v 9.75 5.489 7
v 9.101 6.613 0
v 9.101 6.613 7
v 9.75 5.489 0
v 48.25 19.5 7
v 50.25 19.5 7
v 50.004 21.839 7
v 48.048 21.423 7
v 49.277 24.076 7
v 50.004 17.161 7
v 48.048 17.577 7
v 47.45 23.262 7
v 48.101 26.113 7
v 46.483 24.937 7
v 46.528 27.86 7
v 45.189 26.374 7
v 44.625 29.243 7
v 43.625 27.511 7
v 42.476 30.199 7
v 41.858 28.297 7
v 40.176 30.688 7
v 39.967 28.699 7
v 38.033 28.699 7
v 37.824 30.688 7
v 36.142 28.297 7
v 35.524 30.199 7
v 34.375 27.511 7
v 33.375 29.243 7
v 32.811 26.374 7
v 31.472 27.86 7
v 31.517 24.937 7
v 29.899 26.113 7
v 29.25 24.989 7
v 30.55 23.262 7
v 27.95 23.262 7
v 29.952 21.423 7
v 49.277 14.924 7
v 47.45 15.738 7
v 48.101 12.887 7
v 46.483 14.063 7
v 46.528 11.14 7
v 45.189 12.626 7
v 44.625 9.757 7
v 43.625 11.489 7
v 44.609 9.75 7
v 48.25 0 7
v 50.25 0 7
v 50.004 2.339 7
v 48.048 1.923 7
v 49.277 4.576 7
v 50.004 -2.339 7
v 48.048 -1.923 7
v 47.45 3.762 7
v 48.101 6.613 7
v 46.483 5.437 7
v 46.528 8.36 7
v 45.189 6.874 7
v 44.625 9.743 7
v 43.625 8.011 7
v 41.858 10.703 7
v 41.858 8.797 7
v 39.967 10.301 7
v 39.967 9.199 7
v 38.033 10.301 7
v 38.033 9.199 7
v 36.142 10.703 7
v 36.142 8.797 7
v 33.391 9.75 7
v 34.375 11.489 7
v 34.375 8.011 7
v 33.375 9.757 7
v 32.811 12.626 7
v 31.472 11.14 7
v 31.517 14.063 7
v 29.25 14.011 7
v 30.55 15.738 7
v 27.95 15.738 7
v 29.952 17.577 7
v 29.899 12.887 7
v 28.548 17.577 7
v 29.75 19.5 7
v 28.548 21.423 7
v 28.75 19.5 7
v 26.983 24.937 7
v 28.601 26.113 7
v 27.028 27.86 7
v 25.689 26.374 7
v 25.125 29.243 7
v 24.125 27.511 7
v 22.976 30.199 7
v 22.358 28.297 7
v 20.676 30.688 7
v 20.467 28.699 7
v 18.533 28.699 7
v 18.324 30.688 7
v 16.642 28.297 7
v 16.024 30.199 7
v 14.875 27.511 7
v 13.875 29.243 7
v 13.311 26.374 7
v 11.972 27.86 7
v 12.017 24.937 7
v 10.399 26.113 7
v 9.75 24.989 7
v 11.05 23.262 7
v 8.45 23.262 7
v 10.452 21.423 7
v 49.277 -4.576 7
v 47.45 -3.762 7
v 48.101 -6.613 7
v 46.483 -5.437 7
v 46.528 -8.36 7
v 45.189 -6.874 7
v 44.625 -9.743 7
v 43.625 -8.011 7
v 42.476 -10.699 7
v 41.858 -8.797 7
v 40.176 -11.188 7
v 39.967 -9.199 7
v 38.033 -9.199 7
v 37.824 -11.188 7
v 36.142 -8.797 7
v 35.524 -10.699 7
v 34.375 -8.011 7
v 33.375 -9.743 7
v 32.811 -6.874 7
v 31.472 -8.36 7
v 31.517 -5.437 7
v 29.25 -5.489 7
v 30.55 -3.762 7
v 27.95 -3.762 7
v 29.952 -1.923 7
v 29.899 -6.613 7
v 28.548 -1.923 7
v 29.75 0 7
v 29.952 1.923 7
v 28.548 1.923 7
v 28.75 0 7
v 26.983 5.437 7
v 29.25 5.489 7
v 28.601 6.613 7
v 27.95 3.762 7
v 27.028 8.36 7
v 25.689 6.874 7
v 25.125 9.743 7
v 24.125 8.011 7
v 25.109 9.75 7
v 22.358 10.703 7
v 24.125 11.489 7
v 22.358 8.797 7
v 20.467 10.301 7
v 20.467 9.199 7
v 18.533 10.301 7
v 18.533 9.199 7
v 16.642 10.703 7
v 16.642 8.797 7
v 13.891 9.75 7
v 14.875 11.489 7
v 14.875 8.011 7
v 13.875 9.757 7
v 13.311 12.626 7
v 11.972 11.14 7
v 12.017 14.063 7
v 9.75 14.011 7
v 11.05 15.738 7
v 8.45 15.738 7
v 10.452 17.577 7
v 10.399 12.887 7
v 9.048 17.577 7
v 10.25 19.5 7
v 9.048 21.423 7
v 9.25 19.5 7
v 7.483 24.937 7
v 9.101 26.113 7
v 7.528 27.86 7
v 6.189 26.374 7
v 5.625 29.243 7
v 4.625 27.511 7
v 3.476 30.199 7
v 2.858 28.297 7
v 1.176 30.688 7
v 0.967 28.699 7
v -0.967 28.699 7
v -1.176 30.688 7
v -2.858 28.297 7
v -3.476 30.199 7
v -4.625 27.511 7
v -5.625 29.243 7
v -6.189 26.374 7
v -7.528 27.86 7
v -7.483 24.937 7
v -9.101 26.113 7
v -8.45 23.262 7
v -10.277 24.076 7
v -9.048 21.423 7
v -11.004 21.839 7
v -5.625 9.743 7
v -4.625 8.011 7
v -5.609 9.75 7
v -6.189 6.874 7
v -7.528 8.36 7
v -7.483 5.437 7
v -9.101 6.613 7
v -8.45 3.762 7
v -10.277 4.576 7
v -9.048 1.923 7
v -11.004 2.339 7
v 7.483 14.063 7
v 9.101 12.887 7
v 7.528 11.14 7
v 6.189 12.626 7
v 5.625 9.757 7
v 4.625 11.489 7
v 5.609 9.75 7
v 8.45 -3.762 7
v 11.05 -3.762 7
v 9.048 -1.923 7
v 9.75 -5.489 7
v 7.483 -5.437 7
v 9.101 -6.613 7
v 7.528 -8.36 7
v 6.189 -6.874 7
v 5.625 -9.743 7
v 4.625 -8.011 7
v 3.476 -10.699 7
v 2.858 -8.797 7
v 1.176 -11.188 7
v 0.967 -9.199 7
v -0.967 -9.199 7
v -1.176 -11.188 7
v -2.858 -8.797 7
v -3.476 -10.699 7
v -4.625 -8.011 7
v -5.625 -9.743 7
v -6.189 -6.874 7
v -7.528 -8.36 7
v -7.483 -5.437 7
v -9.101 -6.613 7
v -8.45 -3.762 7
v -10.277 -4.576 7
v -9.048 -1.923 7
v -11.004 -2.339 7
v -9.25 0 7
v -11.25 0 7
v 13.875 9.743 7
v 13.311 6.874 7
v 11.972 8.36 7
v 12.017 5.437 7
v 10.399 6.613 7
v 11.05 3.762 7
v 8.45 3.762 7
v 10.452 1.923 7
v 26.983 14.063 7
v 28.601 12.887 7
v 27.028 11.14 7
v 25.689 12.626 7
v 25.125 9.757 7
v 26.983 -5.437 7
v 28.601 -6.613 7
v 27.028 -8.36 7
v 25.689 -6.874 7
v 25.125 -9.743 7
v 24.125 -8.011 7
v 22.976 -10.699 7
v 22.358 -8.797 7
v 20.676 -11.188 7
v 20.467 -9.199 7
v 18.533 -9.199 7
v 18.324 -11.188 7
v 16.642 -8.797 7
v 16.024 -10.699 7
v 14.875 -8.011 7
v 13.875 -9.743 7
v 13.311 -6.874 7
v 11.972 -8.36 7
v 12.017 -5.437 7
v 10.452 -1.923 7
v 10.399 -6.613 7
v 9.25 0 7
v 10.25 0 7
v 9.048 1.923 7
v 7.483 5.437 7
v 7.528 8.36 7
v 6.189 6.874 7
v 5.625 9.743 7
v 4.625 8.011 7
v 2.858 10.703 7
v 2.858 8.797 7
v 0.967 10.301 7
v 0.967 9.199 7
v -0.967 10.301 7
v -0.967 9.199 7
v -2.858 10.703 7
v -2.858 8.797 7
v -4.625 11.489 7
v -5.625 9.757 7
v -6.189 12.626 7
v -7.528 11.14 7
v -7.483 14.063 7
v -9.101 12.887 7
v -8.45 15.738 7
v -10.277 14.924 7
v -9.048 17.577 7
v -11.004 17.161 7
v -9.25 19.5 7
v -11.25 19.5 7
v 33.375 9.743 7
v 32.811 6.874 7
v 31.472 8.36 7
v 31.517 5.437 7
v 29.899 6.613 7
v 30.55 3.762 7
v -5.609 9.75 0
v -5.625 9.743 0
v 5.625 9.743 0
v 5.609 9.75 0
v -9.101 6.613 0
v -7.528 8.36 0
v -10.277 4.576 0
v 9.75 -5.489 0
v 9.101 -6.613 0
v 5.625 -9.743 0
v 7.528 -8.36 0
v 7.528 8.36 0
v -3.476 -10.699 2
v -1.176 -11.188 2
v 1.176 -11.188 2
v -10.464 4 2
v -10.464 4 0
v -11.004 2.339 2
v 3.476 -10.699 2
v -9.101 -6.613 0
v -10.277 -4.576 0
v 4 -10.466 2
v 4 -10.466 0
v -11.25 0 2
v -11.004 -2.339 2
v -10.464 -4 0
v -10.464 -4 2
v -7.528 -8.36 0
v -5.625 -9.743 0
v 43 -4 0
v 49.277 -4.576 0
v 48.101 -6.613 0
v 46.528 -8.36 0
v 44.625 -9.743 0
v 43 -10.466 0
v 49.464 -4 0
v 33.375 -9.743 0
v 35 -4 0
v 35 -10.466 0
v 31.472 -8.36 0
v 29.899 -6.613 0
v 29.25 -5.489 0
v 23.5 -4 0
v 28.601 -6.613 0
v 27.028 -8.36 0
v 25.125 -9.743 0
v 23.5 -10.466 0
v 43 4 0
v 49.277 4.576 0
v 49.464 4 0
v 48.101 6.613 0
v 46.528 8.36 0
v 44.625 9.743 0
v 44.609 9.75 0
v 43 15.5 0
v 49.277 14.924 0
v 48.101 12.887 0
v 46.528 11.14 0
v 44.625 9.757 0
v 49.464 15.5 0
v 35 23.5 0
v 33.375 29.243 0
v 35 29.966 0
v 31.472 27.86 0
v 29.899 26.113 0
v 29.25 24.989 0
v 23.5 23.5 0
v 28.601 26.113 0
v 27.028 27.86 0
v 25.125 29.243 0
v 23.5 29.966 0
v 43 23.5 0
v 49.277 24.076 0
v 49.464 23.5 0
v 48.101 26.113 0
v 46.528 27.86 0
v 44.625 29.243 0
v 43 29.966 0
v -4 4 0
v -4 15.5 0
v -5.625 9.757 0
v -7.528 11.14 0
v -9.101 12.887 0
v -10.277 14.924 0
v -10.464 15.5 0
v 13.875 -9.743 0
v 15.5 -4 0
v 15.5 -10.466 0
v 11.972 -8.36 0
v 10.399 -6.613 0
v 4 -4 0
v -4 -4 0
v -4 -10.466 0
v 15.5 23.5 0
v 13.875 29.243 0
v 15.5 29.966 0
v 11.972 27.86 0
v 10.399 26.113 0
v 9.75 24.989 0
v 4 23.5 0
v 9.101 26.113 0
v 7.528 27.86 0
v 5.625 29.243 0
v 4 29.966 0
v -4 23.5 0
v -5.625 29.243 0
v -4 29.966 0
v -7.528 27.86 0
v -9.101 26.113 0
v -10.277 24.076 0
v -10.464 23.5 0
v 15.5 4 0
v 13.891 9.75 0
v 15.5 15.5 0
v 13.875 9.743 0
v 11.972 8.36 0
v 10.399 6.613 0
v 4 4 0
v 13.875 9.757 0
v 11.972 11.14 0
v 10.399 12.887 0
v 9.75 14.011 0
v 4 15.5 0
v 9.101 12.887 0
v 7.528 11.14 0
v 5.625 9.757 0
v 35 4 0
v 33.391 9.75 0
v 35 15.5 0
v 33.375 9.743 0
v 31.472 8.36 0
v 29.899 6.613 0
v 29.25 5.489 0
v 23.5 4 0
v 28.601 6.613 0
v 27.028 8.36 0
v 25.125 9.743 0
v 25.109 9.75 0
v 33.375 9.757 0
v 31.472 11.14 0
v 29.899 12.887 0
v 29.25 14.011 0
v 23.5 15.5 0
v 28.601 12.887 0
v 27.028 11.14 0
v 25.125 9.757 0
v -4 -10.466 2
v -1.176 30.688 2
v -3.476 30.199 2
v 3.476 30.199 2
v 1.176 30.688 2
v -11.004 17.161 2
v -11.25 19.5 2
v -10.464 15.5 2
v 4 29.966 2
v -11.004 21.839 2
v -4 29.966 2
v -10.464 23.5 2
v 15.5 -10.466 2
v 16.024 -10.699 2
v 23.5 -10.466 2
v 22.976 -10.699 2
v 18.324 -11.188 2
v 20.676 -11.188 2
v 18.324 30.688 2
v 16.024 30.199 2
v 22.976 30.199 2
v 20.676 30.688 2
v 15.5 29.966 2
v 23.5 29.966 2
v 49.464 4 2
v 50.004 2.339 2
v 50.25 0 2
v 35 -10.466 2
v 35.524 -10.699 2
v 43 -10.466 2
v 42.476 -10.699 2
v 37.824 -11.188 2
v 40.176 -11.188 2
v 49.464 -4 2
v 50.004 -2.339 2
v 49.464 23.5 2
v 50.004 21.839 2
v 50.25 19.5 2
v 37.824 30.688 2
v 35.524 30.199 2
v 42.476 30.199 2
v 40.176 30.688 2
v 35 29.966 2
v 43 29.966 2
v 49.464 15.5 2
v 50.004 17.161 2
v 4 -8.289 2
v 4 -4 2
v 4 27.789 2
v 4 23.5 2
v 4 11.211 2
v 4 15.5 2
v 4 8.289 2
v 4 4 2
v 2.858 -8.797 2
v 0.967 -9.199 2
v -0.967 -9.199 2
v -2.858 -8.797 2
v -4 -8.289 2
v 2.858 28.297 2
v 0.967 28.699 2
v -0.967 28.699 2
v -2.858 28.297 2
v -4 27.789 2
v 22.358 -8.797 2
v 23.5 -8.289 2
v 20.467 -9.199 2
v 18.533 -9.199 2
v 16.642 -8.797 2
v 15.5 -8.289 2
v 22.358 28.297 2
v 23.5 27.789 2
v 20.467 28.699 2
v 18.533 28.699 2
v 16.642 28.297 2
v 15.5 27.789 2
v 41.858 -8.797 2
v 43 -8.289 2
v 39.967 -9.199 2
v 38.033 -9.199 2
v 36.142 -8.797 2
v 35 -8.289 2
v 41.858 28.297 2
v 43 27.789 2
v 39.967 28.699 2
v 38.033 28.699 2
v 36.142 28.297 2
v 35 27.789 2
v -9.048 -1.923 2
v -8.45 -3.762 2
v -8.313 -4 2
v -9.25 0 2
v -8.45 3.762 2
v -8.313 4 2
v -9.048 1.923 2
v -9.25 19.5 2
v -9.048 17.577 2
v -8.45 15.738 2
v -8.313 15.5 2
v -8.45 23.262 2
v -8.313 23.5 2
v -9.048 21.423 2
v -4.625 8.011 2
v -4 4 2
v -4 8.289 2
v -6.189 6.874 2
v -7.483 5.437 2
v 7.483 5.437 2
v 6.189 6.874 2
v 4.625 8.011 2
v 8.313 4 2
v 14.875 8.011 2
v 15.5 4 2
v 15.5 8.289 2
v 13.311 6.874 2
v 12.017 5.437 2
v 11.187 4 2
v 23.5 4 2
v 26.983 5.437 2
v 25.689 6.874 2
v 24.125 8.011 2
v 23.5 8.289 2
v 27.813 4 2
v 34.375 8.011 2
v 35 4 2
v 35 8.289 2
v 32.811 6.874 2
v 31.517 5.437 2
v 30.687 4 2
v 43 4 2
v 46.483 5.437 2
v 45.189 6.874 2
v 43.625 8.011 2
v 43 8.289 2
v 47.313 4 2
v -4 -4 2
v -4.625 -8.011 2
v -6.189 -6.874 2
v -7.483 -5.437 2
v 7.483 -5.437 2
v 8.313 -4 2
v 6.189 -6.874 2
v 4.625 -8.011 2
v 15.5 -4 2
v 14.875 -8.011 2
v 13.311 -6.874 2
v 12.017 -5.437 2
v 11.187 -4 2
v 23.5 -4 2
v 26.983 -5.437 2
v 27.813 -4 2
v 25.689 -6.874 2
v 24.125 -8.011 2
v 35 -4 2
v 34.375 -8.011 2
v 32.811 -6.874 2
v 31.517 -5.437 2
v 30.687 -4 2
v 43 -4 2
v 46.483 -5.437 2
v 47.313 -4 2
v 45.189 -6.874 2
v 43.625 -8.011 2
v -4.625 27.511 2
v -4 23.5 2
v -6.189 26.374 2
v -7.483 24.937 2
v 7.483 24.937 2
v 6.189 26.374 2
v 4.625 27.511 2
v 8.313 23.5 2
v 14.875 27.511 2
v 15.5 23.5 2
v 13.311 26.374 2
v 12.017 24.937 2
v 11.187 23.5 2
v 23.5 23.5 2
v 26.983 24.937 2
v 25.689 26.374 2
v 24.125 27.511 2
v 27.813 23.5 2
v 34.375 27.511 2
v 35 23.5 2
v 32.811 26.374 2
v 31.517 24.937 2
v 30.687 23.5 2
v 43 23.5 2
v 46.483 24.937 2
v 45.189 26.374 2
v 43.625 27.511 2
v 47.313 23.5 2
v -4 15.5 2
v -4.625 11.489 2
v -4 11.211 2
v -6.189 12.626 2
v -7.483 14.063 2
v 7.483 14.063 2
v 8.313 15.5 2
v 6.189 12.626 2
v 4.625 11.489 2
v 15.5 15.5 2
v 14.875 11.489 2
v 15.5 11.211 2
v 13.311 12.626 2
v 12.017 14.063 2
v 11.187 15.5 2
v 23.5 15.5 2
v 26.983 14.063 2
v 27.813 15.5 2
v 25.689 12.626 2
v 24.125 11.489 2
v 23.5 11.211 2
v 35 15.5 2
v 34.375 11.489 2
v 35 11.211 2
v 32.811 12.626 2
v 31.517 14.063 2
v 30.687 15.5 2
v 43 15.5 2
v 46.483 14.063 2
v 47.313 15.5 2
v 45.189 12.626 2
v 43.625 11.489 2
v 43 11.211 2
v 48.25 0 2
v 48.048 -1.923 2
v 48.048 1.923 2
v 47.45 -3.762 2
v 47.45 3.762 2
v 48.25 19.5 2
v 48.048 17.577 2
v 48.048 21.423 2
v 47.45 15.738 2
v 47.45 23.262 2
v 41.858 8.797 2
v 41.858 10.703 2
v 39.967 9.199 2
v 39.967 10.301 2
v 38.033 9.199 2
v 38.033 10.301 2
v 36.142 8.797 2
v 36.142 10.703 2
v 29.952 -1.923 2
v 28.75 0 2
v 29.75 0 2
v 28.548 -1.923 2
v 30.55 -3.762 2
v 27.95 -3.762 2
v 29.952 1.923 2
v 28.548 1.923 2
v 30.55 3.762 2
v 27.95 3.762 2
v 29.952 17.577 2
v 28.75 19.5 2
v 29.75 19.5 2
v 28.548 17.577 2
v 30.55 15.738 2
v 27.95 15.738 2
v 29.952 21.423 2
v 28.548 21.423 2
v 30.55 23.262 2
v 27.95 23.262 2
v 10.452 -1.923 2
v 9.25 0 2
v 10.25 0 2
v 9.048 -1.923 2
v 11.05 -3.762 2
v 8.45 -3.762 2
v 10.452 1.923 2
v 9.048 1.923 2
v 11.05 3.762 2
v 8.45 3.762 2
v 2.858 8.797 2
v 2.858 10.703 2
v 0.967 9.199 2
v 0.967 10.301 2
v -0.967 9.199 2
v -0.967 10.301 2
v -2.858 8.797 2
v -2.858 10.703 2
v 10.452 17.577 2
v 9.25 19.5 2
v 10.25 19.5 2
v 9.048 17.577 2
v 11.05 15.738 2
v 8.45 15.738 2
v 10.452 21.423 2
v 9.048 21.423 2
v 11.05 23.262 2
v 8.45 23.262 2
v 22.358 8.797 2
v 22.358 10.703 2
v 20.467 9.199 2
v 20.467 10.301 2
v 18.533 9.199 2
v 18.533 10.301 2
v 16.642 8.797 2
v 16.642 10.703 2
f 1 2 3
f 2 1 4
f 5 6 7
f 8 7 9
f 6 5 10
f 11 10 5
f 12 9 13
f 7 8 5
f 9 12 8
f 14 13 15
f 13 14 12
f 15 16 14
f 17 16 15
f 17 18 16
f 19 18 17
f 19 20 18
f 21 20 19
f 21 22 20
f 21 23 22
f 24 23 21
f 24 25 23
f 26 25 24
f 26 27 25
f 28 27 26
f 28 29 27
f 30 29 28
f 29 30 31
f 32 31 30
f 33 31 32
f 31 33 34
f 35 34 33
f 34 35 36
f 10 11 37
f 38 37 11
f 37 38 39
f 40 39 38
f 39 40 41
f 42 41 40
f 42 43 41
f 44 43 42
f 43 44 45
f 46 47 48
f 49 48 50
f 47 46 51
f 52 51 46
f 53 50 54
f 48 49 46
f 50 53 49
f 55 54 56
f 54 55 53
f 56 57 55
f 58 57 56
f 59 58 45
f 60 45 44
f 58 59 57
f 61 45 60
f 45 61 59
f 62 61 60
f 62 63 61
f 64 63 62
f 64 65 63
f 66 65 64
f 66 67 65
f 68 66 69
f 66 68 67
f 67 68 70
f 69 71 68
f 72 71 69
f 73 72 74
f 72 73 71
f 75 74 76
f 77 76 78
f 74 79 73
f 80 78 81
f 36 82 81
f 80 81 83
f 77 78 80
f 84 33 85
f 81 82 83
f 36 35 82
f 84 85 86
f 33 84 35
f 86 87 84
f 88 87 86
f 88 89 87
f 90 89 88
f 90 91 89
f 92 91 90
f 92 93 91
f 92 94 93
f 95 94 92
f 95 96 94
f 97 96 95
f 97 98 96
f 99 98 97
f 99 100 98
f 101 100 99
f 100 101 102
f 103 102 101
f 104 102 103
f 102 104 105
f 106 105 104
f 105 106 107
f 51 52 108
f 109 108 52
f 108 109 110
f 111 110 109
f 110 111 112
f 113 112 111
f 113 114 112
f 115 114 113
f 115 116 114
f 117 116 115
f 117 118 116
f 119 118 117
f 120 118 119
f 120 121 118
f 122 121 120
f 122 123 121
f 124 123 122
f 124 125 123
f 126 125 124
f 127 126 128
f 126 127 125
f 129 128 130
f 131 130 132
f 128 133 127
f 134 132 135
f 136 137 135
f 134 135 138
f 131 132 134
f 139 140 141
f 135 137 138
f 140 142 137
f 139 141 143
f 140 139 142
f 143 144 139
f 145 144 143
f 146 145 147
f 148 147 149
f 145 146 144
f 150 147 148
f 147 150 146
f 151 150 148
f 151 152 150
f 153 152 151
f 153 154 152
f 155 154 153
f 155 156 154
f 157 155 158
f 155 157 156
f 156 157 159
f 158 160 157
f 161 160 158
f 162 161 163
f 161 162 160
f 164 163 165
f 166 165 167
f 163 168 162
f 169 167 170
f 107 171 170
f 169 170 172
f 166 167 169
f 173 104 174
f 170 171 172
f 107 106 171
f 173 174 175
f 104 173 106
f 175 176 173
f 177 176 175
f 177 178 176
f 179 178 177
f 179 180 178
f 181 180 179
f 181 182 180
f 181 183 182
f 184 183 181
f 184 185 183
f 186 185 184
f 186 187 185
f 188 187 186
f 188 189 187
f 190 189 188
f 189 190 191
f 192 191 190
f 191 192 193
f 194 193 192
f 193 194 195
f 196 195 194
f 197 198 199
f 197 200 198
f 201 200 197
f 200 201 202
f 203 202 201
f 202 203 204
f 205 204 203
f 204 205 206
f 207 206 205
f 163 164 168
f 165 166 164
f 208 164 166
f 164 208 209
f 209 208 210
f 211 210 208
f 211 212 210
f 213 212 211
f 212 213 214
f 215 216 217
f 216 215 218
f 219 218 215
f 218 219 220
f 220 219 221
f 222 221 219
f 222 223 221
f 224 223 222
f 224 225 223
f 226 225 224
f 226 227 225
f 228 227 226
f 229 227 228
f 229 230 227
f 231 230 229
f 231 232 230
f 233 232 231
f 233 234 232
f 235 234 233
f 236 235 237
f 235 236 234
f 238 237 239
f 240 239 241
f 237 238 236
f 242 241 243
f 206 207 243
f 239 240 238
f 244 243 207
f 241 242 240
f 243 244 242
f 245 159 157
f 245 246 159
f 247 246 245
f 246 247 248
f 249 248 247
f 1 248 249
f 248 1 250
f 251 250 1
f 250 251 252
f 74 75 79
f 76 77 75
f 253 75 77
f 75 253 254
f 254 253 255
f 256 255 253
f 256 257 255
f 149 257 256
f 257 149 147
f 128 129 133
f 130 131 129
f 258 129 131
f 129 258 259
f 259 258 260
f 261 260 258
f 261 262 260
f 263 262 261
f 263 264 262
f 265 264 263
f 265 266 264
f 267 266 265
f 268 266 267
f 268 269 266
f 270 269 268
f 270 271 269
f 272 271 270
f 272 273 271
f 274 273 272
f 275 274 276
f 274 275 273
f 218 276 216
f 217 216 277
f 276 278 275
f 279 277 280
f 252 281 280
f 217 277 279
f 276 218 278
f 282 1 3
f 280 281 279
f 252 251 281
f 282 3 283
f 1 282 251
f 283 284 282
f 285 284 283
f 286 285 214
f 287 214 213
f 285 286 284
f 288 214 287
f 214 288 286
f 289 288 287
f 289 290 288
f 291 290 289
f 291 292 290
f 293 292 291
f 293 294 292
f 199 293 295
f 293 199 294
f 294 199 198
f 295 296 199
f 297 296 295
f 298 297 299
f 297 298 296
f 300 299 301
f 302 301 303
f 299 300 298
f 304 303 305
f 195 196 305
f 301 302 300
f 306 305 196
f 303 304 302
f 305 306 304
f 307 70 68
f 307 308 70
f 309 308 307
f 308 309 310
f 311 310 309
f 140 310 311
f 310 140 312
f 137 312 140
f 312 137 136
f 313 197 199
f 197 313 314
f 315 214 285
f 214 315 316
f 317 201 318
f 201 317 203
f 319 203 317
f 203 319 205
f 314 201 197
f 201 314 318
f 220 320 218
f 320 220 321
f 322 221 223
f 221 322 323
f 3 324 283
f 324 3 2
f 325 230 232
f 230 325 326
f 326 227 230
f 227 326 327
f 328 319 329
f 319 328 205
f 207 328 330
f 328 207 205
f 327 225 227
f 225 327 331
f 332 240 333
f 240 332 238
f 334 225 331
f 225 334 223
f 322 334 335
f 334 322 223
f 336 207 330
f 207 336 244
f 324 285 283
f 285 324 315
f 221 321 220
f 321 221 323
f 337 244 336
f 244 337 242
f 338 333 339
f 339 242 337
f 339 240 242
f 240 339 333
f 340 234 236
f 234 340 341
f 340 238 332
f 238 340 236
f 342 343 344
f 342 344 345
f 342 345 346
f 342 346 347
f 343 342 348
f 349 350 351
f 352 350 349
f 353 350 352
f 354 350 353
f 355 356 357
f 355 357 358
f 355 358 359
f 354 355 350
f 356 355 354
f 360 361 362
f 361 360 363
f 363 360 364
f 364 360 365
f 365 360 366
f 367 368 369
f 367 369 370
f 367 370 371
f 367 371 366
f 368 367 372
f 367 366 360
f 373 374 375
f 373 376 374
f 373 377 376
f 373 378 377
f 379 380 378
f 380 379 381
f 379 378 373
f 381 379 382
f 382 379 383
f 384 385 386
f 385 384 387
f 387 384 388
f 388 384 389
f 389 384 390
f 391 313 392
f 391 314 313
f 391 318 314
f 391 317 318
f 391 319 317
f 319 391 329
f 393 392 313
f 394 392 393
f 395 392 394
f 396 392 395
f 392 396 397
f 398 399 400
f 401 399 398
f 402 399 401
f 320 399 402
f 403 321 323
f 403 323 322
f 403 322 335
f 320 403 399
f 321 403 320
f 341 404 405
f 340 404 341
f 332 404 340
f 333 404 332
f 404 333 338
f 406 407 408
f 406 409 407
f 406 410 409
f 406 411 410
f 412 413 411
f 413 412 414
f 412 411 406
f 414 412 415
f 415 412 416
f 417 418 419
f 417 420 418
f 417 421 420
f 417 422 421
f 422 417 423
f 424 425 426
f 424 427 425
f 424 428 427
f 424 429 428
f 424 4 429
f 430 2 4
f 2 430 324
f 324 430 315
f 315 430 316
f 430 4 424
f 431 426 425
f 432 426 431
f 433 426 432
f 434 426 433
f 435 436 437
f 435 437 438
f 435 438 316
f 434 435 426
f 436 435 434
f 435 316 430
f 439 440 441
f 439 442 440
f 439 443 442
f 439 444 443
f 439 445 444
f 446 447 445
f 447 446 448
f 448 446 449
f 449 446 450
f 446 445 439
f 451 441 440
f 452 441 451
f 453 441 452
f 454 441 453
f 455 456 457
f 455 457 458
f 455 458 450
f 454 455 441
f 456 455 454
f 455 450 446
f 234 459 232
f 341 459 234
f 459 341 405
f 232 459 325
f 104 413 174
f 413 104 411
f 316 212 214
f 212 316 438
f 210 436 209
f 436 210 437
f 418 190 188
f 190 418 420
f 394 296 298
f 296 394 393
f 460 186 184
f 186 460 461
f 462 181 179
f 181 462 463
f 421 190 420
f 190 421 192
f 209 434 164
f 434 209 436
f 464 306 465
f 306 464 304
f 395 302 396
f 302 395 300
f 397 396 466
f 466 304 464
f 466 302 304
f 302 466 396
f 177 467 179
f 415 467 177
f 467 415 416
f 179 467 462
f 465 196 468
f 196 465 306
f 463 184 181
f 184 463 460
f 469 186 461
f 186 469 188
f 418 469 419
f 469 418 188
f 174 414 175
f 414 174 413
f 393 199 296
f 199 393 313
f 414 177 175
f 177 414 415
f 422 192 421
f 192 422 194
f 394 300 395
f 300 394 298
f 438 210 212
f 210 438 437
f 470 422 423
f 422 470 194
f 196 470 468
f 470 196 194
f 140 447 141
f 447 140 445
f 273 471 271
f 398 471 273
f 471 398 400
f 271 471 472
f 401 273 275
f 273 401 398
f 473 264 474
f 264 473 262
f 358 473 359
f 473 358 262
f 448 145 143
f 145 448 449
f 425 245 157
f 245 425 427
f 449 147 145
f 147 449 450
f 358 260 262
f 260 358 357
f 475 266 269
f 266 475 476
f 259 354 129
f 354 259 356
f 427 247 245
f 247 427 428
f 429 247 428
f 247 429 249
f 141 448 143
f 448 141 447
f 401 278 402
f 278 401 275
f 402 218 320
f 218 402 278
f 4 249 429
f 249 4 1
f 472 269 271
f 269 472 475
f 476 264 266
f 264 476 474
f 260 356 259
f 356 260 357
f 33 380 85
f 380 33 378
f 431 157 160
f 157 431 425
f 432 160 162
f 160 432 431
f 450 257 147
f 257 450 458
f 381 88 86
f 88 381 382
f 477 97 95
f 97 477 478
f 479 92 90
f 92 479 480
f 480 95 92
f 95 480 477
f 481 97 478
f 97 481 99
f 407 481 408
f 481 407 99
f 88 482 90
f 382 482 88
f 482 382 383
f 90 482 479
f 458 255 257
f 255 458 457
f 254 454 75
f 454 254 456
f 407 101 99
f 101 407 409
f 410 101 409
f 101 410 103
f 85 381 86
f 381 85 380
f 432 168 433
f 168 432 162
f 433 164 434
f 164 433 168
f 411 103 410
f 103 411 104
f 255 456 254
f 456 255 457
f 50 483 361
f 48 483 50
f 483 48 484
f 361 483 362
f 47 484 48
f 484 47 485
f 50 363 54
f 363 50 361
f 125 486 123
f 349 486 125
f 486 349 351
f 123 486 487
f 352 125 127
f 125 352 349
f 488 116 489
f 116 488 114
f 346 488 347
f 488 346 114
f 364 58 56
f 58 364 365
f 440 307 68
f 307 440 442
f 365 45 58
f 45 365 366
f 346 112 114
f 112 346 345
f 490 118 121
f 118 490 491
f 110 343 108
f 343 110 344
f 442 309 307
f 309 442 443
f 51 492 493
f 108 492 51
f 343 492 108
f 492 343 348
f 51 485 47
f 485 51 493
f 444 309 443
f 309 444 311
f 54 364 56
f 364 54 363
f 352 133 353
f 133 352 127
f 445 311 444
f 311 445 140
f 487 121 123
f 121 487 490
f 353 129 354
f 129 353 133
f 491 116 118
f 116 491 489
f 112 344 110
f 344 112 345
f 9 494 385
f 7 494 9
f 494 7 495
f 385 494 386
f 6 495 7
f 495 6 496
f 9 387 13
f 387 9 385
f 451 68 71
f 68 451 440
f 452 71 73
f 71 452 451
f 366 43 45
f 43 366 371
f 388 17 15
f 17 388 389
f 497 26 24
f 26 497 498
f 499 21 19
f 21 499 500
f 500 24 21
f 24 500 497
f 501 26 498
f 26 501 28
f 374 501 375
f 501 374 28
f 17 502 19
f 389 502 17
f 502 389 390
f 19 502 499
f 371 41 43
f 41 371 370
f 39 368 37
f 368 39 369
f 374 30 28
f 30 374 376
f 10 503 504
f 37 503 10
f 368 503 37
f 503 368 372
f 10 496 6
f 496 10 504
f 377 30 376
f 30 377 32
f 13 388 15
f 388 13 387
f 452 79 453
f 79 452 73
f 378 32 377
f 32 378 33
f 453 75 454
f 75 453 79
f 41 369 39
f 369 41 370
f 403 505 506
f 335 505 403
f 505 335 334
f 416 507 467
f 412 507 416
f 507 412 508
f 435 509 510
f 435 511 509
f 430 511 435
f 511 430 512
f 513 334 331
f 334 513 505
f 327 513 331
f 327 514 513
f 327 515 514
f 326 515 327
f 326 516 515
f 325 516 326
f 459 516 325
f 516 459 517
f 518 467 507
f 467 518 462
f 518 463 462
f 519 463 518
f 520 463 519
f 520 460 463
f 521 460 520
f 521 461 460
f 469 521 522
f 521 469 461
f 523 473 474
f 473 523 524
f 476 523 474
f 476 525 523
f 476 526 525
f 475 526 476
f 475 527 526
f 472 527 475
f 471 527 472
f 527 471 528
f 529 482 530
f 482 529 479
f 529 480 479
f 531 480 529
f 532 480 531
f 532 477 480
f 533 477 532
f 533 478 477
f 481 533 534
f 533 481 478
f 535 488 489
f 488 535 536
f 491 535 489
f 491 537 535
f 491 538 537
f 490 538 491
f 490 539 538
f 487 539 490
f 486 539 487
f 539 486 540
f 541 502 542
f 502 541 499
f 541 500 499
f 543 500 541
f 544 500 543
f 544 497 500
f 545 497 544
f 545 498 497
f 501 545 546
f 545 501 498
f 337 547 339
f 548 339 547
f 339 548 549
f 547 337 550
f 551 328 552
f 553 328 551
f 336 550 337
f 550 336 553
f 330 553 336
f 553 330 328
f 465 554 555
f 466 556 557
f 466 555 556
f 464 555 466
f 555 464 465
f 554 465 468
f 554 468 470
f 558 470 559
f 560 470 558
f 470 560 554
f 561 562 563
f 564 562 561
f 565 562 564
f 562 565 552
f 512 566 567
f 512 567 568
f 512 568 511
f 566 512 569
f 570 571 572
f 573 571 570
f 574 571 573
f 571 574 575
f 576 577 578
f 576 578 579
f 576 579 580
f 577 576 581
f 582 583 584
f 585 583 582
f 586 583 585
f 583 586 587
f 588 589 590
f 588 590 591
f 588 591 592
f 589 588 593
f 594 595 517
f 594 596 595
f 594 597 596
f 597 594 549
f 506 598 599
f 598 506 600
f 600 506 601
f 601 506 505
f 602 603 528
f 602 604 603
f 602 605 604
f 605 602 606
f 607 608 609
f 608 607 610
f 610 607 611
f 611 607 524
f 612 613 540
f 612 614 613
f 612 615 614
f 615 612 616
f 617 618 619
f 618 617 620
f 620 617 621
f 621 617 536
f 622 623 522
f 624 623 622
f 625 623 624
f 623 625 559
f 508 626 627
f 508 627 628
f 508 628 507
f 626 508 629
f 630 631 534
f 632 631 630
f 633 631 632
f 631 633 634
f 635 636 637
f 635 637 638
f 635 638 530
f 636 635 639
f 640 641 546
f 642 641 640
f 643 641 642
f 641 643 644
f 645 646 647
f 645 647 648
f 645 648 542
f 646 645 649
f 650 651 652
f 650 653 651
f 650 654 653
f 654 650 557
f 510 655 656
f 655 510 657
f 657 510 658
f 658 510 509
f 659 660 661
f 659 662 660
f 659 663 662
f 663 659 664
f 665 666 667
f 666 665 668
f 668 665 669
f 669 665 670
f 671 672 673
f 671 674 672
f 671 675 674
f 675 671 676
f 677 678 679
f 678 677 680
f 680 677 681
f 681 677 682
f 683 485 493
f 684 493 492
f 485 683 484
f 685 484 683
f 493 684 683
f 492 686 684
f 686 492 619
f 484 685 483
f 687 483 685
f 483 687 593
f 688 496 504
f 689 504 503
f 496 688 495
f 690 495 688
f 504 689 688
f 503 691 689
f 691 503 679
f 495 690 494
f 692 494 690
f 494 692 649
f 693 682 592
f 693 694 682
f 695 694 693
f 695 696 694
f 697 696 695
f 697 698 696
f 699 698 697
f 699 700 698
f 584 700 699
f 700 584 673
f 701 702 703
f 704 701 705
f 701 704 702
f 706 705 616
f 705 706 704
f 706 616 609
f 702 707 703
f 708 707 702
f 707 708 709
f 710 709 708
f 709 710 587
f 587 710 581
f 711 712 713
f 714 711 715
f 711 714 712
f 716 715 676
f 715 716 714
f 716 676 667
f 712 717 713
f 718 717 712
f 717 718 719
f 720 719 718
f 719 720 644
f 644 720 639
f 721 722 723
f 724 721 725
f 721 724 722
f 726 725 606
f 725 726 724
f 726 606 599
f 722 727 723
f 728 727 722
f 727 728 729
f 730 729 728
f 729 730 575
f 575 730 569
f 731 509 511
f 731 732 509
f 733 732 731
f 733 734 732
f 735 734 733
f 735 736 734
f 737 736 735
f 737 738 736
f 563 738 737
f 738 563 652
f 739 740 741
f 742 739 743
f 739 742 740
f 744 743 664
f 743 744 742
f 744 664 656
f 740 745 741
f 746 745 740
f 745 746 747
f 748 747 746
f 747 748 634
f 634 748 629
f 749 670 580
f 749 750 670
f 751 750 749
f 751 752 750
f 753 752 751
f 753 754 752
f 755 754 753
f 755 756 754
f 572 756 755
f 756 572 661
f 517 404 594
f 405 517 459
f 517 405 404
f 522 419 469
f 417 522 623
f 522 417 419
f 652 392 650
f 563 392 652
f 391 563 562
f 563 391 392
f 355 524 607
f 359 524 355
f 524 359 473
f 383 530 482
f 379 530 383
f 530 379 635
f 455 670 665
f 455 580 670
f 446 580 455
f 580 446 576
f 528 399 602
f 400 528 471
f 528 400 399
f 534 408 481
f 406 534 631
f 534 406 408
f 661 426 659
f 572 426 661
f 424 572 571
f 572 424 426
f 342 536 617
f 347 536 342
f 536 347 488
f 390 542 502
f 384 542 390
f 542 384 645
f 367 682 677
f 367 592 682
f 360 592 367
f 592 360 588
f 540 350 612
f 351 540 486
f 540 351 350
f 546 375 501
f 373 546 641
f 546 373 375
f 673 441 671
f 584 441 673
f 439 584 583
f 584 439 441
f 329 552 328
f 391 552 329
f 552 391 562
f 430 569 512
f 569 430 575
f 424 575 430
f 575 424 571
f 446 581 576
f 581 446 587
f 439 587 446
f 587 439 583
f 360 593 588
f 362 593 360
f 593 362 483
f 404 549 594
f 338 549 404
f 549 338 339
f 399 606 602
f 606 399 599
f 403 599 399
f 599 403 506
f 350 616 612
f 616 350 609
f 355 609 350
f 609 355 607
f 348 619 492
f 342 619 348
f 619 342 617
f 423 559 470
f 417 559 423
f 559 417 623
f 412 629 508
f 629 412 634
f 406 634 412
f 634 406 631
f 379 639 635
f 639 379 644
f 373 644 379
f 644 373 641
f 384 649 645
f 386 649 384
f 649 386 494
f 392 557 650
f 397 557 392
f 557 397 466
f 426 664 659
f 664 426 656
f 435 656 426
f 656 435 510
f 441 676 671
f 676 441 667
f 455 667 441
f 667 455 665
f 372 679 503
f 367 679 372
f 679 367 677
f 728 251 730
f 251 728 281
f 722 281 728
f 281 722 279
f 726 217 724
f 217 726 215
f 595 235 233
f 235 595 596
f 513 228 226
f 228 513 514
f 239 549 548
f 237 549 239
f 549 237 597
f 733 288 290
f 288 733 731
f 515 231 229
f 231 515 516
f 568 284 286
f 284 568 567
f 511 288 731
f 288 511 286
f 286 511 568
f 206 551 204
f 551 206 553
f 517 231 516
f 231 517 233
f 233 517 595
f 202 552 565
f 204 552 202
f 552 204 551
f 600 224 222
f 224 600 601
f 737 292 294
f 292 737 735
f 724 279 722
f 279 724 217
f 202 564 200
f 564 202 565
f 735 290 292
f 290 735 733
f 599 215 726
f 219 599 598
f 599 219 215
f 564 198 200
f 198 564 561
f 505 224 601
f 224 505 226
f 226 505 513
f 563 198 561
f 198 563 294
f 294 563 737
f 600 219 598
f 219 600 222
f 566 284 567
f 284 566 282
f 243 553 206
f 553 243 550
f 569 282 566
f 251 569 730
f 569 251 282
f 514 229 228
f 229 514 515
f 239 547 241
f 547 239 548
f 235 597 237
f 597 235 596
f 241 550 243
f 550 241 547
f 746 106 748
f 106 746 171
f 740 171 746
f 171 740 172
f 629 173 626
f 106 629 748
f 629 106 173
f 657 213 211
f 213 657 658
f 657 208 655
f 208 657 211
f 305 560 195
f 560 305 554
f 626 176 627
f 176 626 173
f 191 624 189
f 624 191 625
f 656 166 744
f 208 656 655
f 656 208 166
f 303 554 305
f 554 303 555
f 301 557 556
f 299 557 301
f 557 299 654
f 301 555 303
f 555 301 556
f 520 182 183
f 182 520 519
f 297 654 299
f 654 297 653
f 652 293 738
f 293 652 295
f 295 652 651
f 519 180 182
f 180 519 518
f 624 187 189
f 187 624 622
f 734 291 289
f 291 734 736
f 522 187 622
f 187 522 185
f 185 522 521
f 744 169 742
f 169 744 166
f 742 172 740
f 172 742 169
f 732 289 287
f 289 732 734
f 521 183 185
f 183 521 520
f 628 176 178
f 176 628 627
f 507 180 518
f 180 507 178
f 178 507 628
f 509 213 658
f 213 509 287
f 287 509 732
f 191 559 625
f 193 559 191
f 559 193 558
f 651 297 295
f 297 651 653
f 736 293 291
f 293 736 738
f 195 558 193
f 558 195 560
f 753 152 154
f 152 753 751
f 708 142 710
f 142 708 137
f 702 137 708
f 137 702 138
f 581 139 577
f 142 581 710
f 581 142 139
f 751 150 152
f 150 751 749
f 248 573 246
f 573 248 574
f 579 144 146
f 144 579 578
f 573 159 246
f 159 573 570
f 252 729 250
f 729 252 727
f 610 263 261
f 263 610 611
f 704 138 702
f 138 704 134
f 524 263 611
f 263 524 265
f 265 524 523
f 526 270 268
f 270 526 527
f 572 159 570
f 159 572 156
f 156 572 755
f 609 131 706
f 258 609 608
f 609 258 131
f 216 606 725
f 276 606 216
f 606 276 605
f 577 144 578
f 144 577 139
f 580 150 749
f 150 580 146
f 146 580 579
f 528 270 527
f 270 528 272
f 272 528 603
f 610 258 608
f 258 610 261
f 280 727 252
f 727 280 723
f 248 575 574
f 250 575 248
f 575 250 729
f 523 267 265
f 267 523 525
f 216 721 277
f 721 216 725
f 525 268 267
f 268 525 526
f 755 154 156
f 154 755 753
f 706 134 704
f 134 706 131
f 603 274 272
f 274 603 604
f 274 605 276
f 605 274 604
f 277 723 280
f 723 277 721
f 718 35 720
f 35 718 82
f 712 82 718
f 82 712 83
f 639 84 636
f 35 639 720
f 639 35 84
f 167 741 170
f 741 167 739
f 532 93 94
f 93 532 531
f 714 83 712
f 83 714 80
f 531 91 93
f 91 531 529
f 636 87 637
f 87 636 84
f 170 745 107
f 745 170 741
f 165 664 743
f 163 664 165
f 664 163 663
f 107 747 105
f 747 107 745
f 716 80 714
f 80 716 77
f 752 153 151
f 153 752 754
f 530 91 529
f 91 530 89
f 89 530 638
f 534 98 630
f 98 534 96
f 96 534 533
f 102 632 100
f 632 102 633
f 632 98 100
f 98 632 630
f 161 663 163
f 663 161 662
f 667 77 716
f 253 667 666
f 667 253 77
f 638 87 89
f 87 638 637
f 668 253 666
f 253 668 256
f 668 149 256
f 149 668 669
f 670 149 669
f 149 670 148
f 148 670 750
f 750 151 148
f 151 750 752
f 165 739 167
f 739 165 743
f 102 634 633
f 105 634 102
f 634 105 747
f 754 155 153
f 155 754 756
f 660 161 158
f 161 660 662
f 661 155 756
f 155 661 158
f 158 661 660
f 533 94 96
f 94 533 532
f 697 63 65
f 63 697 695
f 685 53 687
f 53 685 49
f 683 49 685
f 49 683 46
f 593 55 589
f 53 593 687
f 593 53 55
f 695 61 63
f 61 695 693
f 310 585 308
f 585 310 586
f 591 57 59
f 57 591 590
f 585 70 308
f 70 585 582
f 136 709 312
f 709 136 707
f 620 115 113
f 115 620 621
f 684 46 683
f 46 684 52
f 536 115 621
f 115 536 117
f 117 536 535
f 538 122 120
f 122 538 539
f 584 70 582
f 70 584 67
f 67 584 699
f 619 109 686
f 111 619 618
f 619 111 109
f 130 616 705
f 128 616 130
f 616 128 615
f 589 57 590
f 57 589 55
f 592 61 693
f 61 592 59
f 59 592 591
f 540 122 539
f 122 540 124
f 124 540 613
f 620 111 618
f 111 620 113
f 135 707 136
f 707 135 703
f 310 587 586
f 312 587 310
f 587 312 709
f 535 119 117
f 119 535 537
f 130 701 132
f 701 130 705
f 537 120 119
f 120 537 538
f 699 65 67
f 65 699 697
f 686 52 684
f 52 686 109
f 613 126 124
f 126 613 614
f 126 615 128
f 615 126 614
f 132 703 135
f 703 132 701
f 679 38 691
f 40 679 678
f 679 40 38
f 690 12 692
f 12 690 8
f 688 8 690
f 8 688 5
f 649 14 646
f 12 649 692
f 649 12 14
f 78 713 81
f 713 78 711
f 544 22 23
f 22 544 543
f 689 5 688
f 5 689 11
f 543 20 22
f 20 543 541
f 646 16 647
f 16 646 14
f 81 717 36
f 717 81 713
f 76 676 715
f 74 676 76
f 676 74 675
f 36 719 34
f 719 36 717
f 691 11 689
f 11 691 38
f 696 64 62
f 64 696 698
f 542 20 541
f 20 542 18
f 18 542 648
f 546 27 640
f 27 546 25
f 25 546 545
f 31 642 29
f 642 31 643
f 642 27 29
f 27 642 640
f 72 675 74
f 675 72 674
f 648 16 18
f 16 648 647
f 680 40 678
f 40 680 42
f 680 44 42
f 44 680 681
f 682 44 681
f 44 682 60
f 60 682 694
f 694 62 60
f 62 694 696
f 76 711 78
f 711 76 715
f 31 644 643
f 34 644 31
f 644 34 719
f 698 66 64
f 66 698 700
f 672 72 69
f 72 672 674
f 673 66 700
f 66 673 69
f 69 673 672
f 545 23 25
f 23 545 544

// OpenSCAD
// Copyright 2019 Marcos Del Sol Vives
// SPDX-License-Identifier: ISC

// Number of cells in X
x_count = 3;

// Number of cells in Y
y_count = 2;

// Cell diameter (18 for 18650)
cell_diameter	 = 18 + 0.5;

// Space between cells
battery_padding = 1;

// Border around cells for additional firmness
battery_border = 1.5;

// Height of the tab holding the cells in place
tab_height = 5;

// Width of the cable guide
guide_width = 8;

// Height of the cable guide
guide_height = 2;

difference() {
	union() {
		for (x = [0 : x_count - 1]) {
			for (y = [0 : y_count - 1]) {
				translate([
					x * (battery_padding + cell_diameter	),
					y * (battery_padding + cell_diameter	)
				])
					cylinder(d = cell_diameter	 + battery_padding + 2 * battery_border, h = guide_height + tab_height);
			}
		}
	}

	// Columns
	for (x = [0 : x_count - 1]) {
		translate([
			(battery_padding + cell_diameter	) * x - guide_width / 2,
			-battery_border - battery_padding / 2 - cell_diameter	 / 2
		])
			cube([guide_width, 2 * battery_border + (battery_padding + cell_diameter	) * y_count, guide_height]);
	}

	// Rows
	for (y = [0 : y_count - 1]) {
		translate([
			-battery_border - battery_padding / 2 - cell_diameter	 / 2,
			(battery_padding + cell_diameter	) * y - guide_width / 2
		])
			cube([2 * battery_border + (battery_padding + cell_diameter	) * x_count, guide_width, guide_height]);
	}

	for (x = [0 : x_count - 1]) {
		for (y = [0 : y_count - 1]) {
			translate([
				x * (battery_padding + cell_diameter	),
				y * (battery_padding + cell_diameter	),
				guide_height
			])
				cylinder(d = cell_diameter	, h = tab_height);
		}
	}
}
